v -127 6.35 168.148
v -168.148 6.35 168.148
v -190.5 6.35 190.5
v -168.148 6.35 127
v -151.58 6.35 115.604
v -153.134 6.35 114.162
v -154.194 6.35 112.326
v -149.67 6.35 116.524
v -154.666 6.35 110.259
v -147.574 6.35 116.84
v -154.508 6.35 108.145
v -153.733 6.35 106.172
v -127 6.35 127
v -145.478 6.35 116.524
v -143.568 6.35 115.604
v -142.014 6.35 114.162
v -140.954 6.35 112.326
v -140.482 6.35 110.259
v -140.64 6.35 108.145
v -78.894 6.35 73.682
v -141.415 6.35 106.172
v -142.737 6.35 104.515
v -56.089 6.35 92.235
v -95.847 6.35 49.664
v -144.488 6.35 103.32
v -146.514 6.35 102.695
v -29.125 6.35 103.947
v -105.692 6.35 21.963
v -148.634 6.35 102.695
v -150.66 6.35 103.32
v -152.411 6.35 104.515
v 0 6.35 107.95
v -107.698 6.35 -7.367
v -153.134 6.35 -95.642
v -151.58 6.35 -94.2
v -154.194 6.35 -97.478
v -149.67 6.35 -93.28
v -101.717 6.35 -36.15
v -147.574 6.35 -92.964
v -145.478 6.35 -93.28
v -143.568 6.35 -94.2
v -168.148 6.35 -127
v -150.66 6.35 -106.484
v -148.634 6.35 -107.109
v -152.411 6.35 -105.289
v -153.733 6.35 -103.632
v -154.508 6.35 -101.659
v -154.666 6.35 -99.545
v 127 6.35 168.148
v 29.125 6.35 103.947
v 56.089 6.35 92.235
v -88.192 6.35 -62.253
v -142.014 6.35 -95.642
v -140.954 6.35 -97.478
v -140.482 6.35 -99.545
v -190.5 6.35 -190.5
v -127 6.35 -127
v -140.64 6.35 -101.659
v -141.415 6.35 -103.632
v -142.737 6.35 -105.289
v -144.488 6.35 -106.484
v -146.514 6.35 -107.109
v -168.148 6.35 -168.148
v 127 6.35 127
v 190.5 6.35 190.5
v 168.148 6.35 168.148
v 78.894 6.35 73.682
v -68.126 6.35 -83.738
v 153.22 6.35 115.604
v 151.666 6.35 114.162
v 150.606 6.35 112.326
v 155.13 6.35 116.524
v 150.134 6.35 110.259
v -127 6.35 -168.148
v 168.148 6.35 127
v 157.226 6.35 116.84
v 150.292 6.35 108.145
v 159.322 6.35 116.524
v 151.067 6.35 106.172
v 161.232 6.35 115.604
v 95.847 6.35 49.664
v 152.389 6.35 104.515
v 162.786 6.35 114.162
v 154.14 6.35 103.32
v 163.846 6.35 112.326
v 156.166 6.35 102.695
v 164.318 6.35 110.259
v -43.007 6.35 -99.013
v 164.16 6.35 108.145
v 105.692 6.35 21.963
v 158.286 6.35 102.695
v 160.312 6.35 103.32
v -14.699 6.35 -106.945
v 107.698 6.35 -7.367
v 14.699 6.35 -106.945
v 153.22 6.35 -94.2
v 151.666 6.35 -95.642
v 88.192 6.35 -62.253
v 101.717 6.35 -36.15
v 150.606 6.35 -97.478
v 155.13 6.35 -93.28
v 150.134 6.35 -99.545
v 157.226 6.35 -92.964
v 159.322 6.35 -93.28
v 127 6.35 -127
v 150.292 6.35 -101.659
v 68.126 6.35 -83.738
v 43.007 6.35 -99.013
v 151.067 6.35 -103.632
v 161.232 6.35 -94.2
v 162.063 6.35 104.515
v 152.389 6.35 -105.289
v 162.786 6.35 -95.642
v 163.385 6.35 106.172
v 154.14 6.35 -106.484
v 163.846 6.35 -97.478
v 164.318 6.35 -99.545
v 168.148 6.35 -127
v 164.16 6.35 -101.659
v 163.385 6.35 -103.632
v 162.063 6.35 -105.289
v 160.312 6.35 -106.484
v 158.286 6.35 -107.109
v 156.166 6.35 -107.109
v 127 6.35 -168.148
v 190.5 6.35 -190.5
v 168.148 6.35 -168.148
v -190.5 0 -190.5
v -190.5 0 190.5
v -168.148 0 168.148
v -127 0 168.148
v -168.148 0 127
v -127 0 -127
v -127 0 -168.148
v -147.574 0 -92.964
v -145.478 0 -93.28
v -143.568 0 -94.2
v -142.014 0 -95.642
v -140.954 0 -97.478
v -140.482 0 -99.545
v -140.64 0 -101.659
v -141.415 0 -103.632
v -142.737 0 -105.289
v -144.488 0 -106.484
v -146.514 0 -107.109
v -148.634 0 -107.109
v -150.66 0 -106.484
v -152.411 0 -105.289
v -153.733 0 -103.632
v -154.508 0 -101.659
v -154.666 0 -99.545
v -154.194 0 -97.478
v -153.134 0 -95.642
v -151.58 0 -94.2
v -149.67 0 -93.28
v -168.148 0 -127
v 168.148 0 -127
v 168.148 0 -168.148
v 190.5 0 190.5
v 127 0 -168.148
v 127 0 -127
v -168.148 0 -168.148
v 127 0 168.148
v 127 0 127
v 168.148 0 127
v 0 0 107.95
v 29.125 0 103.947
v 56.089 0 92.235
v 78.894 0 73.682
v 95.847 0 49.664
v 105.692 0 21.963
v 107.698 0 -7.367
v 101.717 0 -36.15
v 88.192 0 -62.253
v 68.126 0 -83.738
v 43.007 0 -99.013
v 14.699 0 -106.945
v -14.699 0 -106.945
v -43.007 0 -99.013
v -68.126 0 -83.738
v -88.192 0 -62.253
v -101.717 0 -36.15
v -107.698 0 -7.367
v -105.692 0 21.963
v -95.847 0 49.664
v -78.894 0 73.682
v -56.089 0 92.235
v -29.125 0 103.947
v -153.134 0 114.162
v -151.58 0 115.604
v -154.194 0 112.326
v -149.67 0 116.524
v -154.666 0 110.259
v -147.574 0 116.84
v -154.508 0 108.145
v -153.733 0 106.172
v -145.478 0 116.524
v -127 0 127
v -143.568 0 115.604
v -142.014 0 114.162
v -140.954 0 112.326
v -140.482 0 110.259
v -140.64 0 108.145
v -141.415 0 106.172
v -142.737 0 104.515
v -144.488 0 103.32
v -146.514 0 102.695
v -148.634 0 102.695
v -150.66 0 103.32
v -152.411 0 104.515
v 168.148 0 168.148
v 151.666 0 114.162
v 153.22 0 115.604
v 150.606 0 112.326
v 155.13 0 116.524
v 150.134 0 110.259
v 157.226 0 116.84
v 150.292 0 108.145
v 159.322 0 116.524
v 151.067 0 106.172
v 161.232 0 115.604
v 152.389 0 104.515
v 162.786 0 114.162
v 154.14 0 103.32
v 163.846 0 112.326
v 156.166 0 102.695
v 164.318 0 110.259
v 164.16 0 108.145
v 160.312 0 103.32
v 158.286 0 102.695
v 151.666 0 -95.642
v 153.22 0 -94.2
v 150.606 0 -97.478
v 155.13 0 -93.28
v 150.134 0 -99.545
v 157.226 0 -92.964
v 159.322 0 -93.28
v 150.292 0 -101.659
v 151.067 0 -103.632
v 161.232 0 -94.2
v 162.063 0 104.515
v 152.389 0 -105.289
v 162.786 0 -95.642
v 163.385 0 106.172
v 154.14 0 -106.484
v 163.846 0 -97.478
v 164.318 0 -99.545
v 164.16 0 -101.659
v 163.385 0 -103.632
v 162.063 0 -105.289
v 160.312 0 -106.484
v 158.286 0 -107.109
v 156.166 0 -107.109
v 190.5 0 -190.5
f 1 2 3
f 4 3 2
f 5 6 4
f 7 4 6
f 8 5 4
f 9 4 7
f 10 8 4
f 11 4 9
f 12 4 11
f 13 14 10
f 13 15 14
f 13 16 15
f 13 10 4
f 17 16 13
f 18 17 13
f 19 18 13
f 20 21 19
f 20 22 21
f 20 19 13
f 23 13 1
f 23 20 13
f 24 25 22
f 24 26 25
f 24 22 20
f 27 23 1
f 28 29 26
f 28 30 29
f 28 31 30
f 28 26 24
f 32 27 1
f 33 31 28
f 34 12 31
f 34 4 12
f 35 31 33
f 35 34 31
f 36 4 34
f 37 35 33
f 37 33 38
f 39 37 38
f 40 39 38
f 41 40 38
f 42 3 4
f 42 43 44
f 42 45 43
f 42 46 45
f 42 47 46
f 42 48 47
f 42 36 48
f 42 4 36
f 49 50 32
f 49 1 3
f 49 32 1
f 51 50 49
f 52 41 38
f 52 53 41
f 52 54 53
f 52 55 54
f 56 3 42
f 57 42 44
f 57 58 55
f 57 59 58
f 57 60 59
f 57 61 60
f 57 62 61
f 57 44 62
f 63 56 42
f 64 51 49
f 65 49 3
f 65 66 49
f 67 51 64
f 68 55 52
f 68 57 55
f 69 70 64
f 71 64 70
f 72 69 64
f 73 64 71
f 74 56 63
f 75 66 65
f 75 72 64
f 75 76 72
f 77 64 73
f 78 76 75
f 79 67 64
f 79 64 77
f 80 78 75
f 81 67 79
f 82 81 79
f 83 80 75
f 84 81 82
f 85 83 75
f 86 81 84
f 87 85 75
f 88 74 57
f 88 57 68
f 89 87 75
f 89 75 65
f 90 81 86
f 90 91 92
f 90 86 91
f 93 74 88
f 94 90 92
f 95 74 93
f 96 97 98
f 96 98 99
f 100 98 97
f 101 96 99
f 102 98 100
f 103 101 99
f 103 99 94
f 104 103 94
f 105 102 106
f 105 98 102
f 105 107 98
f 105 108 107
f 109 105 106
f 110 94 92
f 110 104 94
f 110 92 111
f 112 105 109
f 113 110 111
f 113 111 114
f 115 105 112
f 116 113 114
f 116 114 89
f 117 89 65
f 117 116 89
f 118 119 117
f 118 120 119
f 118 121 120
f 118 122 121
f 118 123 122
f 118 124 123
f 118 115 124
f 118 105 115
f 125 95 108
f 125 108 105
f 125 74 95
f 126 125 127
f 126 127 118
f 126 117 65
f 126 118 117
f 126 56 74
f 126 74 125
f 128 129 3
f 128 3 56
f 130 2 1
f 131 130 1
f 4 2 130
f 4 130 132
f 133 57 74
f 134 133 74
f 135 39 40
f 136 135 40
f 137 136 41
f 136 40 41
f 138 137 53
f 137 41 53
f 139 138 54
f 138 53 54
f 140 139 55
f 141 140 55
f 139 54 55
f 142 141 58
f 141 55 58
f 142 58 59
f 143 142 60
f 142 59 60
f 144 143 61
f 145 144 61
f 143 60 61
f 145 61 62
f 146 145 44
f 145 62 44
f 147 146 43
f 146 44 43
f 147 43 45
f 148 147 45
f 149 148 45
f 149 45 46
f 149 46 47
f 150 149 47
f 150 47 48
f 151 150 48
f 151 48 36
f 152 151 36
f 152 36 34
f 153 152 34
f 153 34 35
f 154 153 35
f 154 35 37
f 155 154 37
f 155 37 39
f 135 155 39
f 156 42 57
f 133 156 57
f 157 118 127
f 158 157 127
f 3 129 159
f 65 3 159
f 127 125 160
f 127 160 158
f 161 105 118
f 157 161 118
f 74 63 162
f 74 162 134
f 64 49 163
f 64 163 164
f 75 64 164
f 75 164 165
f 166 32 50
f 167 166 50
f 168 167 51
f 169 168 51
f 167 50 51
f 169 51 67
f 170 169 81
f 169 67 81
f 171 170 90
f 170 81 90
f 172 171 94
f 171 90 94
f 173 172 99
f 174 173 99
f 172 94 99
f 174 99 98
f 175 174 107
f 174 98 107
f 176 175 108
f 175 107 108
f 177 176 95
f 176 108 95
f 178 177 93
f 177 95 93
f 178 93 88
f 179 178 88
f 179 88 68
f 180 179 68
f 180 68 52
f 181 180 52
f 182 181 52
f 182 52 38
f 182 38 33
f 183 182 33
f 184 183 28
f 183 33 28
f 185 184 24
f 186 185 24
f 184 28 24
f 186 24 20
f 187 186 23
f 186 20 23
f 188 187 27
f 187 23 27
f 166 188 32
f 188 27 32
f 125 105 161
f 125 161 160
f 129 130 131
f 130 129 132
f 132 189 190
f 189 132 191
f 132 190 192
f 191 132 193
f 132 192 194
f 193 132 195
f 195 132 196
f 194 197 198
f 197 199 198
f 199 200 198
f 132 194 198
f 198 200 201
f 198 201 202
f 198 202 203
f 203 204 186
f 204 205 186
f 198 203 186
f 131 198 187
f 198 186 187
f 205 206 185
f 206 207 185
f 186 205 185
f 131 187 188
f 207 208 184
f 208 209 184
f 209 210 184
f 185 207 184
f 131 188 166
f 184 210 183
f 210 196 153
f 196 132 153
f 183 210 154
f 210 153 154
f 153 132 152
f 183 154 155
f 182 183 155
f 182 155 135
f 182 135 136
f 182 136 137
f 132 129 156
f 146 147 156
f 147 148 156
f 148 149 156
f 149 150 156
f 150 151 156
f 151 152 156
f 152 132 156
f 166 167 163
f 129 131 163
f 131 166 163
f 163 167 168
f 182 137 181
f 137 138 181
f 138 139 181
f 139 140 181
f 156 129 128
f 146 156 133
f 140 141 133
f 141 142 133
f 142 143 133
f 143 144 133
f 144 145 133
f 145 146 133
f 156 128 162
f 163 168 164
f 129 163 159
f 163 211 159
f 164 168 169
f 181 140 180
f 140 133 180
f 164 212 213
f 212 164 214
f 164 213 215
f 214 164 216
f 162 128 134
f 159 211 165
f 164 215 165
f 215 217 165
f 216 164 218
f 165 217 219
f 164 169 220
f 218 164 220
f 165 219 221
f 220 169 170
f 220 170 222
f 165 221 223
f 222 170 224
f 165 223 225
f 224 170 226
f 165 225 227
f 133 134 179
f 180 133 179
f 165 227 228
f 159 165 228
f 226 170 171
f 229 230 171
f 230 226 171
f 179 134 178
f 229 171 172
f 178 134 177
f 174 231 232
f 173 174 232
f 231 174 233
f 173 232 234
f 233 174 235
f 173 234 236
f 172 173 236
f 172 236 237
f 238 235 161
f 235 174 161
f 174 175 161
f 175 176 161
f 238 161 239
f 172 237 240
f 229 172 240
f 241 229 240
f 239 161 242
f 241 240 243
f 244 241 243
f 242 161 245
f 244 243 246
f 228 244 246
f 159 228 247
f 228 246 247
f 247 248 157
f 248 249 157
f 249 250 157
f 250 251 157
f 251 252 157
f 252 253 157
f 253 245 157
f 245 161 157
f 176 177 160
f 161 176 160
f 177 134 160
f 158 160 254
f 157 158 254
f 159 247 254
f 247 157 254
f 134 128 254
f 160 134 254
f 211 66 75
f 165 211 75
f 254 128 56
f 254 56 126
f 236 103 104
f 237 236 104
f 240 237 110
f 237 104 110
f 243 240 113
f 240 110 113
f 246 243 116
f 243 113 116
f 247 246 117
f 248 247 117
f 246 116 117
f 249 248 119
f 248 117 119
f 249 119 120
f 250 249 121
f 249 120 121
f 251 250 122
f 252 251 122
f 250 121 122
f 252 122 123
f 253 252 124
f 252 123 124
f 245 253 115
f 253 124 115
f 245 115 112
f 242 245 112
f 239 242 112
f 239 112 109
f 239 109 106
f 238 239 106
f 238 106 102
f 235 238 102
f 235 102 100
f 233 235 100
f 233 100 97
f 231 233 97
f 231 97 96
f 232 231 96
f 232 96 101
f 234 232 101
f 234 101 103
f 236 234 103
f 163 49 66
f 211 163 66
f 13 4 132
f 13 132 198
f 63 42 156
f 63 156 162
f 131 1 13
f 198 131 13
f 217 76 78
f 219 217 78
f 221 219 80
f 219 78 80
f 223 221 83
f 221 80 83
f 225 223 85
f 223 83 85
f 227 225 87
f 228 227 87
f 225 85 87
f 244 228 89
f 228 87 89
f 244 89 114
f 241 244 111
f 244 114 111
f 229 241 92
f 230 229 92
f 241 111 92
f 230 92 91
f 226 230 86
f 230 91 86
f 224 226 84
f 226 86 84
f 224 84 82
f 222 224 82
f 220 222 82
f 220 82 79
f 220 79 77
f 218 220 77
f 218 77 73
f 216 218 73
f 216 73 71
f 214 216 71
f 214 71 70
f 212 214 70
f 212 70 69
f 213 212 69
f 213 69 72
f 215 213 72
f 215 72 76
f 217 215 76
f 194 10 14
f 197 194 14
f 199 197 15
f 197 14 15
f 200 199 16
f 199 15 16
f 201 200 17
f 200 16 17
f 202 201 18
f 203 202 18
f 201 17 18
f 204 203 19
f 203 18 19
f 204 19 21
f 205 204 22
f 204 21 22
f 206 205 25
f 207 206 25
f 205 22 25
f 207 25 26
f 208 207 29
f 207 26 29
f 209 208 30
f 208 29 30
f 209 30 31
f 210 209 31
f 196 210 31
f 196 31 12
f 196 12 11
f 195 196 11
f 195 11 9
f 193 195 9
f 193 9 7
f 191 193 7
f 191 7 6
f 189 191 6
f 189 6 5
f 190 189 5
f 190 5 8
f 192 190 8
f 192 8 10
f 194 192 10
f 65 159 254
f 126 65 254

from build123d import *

# Parameters (mm, degrees)
SKETCH1_W           = 381
SKETCH1_H           = 381
BOSS_EXTRUDE1_DEPTH = 6.35
SKETCH2_R           = 107.95
CUT_EXTRUDE1_DEPTH  = 6.35
SKETCH3_W           = 41.148
SKETCH3_H           = 41.148
CUT_EXTRUDE2_DEPTH  = 6.35
SKETCH3_4_R         = 7.112
CUT_EXTRUDE3_DEPTH  = 270.482508709


with BuildPart() as part:
    # Sketch1 → Boss-Extrude1 (new body)
    with BuildSketch(Plane(origin=(0, 0, 0), x_dir=(1, 0, 0), z_dir=(0, 1, 0))):
        Rectangle(SKETCH1_W, SKETCH1_H)
    extrude(amount=BOSS_EXTRUDE1_DEPTH)

    # Sketch2 → Cut-Extrude1 (cut)
    with BuildSketch(Plane(origin=(0, 6.35, 0), x_dir=(1, 0, 0), z_dir=(0, 1, 0))):
        Circle(SKETCH2_R)
    extrude(amount=-CUT_EXTRUDE1_DEPTH, mode=Mode.SUBTRACT)

    # Sketch3 → Cut-Extrude2 (cut)
    with BuildSketch(Plane(origin=(0, 6.35, 0), x_dir=(1, 0, 0), z_dir=(0, 1, 0))):
        with Locations((147.574, 147.574)):
            Rectangle(SKETCH3_W, SKETCH3_H)
        with Locations((-147.574, 147.574)):
            Rectangle(SKETCH3_W, SKETCH3_H)
        with Locations((147.574, -147.574)):
            Rectangle(SKETCH3_W, SKETCH3_H)
        with Locations((-147.574, -147.574)):
            Rectangle(SKETCH3_W, SKETCH3_H)
    extrude(amount=-CUT_EXTRUDE2_DEPTH, mode=Mode.SUBTRACT)

    # Sketch3<4> → Cut-Extrude3 (cut, through all)
    with BuildSketch(Plane(origin=(0, 6.35, 0), x_dir=(1, 0, 0), z_dir=(0, 1, 0))):
        with Locations((-147.574, 100.076)):
            Circle(SKETCH3_4_R)
        with Locations((157.226, 100.076)):
            Circle(SKETCH3_4_R)
        with Locations((157.226, -109.728)):
            Circle(SKETCH3_4_R)
        with Locations((-147.574, -109.728)):
            Circle(SKETCH3_4_R)
    extrude(amount=-CUT_EXTRUDE3_DEPTH, mode=Mode.SUBTRACT)


solid = part.part
